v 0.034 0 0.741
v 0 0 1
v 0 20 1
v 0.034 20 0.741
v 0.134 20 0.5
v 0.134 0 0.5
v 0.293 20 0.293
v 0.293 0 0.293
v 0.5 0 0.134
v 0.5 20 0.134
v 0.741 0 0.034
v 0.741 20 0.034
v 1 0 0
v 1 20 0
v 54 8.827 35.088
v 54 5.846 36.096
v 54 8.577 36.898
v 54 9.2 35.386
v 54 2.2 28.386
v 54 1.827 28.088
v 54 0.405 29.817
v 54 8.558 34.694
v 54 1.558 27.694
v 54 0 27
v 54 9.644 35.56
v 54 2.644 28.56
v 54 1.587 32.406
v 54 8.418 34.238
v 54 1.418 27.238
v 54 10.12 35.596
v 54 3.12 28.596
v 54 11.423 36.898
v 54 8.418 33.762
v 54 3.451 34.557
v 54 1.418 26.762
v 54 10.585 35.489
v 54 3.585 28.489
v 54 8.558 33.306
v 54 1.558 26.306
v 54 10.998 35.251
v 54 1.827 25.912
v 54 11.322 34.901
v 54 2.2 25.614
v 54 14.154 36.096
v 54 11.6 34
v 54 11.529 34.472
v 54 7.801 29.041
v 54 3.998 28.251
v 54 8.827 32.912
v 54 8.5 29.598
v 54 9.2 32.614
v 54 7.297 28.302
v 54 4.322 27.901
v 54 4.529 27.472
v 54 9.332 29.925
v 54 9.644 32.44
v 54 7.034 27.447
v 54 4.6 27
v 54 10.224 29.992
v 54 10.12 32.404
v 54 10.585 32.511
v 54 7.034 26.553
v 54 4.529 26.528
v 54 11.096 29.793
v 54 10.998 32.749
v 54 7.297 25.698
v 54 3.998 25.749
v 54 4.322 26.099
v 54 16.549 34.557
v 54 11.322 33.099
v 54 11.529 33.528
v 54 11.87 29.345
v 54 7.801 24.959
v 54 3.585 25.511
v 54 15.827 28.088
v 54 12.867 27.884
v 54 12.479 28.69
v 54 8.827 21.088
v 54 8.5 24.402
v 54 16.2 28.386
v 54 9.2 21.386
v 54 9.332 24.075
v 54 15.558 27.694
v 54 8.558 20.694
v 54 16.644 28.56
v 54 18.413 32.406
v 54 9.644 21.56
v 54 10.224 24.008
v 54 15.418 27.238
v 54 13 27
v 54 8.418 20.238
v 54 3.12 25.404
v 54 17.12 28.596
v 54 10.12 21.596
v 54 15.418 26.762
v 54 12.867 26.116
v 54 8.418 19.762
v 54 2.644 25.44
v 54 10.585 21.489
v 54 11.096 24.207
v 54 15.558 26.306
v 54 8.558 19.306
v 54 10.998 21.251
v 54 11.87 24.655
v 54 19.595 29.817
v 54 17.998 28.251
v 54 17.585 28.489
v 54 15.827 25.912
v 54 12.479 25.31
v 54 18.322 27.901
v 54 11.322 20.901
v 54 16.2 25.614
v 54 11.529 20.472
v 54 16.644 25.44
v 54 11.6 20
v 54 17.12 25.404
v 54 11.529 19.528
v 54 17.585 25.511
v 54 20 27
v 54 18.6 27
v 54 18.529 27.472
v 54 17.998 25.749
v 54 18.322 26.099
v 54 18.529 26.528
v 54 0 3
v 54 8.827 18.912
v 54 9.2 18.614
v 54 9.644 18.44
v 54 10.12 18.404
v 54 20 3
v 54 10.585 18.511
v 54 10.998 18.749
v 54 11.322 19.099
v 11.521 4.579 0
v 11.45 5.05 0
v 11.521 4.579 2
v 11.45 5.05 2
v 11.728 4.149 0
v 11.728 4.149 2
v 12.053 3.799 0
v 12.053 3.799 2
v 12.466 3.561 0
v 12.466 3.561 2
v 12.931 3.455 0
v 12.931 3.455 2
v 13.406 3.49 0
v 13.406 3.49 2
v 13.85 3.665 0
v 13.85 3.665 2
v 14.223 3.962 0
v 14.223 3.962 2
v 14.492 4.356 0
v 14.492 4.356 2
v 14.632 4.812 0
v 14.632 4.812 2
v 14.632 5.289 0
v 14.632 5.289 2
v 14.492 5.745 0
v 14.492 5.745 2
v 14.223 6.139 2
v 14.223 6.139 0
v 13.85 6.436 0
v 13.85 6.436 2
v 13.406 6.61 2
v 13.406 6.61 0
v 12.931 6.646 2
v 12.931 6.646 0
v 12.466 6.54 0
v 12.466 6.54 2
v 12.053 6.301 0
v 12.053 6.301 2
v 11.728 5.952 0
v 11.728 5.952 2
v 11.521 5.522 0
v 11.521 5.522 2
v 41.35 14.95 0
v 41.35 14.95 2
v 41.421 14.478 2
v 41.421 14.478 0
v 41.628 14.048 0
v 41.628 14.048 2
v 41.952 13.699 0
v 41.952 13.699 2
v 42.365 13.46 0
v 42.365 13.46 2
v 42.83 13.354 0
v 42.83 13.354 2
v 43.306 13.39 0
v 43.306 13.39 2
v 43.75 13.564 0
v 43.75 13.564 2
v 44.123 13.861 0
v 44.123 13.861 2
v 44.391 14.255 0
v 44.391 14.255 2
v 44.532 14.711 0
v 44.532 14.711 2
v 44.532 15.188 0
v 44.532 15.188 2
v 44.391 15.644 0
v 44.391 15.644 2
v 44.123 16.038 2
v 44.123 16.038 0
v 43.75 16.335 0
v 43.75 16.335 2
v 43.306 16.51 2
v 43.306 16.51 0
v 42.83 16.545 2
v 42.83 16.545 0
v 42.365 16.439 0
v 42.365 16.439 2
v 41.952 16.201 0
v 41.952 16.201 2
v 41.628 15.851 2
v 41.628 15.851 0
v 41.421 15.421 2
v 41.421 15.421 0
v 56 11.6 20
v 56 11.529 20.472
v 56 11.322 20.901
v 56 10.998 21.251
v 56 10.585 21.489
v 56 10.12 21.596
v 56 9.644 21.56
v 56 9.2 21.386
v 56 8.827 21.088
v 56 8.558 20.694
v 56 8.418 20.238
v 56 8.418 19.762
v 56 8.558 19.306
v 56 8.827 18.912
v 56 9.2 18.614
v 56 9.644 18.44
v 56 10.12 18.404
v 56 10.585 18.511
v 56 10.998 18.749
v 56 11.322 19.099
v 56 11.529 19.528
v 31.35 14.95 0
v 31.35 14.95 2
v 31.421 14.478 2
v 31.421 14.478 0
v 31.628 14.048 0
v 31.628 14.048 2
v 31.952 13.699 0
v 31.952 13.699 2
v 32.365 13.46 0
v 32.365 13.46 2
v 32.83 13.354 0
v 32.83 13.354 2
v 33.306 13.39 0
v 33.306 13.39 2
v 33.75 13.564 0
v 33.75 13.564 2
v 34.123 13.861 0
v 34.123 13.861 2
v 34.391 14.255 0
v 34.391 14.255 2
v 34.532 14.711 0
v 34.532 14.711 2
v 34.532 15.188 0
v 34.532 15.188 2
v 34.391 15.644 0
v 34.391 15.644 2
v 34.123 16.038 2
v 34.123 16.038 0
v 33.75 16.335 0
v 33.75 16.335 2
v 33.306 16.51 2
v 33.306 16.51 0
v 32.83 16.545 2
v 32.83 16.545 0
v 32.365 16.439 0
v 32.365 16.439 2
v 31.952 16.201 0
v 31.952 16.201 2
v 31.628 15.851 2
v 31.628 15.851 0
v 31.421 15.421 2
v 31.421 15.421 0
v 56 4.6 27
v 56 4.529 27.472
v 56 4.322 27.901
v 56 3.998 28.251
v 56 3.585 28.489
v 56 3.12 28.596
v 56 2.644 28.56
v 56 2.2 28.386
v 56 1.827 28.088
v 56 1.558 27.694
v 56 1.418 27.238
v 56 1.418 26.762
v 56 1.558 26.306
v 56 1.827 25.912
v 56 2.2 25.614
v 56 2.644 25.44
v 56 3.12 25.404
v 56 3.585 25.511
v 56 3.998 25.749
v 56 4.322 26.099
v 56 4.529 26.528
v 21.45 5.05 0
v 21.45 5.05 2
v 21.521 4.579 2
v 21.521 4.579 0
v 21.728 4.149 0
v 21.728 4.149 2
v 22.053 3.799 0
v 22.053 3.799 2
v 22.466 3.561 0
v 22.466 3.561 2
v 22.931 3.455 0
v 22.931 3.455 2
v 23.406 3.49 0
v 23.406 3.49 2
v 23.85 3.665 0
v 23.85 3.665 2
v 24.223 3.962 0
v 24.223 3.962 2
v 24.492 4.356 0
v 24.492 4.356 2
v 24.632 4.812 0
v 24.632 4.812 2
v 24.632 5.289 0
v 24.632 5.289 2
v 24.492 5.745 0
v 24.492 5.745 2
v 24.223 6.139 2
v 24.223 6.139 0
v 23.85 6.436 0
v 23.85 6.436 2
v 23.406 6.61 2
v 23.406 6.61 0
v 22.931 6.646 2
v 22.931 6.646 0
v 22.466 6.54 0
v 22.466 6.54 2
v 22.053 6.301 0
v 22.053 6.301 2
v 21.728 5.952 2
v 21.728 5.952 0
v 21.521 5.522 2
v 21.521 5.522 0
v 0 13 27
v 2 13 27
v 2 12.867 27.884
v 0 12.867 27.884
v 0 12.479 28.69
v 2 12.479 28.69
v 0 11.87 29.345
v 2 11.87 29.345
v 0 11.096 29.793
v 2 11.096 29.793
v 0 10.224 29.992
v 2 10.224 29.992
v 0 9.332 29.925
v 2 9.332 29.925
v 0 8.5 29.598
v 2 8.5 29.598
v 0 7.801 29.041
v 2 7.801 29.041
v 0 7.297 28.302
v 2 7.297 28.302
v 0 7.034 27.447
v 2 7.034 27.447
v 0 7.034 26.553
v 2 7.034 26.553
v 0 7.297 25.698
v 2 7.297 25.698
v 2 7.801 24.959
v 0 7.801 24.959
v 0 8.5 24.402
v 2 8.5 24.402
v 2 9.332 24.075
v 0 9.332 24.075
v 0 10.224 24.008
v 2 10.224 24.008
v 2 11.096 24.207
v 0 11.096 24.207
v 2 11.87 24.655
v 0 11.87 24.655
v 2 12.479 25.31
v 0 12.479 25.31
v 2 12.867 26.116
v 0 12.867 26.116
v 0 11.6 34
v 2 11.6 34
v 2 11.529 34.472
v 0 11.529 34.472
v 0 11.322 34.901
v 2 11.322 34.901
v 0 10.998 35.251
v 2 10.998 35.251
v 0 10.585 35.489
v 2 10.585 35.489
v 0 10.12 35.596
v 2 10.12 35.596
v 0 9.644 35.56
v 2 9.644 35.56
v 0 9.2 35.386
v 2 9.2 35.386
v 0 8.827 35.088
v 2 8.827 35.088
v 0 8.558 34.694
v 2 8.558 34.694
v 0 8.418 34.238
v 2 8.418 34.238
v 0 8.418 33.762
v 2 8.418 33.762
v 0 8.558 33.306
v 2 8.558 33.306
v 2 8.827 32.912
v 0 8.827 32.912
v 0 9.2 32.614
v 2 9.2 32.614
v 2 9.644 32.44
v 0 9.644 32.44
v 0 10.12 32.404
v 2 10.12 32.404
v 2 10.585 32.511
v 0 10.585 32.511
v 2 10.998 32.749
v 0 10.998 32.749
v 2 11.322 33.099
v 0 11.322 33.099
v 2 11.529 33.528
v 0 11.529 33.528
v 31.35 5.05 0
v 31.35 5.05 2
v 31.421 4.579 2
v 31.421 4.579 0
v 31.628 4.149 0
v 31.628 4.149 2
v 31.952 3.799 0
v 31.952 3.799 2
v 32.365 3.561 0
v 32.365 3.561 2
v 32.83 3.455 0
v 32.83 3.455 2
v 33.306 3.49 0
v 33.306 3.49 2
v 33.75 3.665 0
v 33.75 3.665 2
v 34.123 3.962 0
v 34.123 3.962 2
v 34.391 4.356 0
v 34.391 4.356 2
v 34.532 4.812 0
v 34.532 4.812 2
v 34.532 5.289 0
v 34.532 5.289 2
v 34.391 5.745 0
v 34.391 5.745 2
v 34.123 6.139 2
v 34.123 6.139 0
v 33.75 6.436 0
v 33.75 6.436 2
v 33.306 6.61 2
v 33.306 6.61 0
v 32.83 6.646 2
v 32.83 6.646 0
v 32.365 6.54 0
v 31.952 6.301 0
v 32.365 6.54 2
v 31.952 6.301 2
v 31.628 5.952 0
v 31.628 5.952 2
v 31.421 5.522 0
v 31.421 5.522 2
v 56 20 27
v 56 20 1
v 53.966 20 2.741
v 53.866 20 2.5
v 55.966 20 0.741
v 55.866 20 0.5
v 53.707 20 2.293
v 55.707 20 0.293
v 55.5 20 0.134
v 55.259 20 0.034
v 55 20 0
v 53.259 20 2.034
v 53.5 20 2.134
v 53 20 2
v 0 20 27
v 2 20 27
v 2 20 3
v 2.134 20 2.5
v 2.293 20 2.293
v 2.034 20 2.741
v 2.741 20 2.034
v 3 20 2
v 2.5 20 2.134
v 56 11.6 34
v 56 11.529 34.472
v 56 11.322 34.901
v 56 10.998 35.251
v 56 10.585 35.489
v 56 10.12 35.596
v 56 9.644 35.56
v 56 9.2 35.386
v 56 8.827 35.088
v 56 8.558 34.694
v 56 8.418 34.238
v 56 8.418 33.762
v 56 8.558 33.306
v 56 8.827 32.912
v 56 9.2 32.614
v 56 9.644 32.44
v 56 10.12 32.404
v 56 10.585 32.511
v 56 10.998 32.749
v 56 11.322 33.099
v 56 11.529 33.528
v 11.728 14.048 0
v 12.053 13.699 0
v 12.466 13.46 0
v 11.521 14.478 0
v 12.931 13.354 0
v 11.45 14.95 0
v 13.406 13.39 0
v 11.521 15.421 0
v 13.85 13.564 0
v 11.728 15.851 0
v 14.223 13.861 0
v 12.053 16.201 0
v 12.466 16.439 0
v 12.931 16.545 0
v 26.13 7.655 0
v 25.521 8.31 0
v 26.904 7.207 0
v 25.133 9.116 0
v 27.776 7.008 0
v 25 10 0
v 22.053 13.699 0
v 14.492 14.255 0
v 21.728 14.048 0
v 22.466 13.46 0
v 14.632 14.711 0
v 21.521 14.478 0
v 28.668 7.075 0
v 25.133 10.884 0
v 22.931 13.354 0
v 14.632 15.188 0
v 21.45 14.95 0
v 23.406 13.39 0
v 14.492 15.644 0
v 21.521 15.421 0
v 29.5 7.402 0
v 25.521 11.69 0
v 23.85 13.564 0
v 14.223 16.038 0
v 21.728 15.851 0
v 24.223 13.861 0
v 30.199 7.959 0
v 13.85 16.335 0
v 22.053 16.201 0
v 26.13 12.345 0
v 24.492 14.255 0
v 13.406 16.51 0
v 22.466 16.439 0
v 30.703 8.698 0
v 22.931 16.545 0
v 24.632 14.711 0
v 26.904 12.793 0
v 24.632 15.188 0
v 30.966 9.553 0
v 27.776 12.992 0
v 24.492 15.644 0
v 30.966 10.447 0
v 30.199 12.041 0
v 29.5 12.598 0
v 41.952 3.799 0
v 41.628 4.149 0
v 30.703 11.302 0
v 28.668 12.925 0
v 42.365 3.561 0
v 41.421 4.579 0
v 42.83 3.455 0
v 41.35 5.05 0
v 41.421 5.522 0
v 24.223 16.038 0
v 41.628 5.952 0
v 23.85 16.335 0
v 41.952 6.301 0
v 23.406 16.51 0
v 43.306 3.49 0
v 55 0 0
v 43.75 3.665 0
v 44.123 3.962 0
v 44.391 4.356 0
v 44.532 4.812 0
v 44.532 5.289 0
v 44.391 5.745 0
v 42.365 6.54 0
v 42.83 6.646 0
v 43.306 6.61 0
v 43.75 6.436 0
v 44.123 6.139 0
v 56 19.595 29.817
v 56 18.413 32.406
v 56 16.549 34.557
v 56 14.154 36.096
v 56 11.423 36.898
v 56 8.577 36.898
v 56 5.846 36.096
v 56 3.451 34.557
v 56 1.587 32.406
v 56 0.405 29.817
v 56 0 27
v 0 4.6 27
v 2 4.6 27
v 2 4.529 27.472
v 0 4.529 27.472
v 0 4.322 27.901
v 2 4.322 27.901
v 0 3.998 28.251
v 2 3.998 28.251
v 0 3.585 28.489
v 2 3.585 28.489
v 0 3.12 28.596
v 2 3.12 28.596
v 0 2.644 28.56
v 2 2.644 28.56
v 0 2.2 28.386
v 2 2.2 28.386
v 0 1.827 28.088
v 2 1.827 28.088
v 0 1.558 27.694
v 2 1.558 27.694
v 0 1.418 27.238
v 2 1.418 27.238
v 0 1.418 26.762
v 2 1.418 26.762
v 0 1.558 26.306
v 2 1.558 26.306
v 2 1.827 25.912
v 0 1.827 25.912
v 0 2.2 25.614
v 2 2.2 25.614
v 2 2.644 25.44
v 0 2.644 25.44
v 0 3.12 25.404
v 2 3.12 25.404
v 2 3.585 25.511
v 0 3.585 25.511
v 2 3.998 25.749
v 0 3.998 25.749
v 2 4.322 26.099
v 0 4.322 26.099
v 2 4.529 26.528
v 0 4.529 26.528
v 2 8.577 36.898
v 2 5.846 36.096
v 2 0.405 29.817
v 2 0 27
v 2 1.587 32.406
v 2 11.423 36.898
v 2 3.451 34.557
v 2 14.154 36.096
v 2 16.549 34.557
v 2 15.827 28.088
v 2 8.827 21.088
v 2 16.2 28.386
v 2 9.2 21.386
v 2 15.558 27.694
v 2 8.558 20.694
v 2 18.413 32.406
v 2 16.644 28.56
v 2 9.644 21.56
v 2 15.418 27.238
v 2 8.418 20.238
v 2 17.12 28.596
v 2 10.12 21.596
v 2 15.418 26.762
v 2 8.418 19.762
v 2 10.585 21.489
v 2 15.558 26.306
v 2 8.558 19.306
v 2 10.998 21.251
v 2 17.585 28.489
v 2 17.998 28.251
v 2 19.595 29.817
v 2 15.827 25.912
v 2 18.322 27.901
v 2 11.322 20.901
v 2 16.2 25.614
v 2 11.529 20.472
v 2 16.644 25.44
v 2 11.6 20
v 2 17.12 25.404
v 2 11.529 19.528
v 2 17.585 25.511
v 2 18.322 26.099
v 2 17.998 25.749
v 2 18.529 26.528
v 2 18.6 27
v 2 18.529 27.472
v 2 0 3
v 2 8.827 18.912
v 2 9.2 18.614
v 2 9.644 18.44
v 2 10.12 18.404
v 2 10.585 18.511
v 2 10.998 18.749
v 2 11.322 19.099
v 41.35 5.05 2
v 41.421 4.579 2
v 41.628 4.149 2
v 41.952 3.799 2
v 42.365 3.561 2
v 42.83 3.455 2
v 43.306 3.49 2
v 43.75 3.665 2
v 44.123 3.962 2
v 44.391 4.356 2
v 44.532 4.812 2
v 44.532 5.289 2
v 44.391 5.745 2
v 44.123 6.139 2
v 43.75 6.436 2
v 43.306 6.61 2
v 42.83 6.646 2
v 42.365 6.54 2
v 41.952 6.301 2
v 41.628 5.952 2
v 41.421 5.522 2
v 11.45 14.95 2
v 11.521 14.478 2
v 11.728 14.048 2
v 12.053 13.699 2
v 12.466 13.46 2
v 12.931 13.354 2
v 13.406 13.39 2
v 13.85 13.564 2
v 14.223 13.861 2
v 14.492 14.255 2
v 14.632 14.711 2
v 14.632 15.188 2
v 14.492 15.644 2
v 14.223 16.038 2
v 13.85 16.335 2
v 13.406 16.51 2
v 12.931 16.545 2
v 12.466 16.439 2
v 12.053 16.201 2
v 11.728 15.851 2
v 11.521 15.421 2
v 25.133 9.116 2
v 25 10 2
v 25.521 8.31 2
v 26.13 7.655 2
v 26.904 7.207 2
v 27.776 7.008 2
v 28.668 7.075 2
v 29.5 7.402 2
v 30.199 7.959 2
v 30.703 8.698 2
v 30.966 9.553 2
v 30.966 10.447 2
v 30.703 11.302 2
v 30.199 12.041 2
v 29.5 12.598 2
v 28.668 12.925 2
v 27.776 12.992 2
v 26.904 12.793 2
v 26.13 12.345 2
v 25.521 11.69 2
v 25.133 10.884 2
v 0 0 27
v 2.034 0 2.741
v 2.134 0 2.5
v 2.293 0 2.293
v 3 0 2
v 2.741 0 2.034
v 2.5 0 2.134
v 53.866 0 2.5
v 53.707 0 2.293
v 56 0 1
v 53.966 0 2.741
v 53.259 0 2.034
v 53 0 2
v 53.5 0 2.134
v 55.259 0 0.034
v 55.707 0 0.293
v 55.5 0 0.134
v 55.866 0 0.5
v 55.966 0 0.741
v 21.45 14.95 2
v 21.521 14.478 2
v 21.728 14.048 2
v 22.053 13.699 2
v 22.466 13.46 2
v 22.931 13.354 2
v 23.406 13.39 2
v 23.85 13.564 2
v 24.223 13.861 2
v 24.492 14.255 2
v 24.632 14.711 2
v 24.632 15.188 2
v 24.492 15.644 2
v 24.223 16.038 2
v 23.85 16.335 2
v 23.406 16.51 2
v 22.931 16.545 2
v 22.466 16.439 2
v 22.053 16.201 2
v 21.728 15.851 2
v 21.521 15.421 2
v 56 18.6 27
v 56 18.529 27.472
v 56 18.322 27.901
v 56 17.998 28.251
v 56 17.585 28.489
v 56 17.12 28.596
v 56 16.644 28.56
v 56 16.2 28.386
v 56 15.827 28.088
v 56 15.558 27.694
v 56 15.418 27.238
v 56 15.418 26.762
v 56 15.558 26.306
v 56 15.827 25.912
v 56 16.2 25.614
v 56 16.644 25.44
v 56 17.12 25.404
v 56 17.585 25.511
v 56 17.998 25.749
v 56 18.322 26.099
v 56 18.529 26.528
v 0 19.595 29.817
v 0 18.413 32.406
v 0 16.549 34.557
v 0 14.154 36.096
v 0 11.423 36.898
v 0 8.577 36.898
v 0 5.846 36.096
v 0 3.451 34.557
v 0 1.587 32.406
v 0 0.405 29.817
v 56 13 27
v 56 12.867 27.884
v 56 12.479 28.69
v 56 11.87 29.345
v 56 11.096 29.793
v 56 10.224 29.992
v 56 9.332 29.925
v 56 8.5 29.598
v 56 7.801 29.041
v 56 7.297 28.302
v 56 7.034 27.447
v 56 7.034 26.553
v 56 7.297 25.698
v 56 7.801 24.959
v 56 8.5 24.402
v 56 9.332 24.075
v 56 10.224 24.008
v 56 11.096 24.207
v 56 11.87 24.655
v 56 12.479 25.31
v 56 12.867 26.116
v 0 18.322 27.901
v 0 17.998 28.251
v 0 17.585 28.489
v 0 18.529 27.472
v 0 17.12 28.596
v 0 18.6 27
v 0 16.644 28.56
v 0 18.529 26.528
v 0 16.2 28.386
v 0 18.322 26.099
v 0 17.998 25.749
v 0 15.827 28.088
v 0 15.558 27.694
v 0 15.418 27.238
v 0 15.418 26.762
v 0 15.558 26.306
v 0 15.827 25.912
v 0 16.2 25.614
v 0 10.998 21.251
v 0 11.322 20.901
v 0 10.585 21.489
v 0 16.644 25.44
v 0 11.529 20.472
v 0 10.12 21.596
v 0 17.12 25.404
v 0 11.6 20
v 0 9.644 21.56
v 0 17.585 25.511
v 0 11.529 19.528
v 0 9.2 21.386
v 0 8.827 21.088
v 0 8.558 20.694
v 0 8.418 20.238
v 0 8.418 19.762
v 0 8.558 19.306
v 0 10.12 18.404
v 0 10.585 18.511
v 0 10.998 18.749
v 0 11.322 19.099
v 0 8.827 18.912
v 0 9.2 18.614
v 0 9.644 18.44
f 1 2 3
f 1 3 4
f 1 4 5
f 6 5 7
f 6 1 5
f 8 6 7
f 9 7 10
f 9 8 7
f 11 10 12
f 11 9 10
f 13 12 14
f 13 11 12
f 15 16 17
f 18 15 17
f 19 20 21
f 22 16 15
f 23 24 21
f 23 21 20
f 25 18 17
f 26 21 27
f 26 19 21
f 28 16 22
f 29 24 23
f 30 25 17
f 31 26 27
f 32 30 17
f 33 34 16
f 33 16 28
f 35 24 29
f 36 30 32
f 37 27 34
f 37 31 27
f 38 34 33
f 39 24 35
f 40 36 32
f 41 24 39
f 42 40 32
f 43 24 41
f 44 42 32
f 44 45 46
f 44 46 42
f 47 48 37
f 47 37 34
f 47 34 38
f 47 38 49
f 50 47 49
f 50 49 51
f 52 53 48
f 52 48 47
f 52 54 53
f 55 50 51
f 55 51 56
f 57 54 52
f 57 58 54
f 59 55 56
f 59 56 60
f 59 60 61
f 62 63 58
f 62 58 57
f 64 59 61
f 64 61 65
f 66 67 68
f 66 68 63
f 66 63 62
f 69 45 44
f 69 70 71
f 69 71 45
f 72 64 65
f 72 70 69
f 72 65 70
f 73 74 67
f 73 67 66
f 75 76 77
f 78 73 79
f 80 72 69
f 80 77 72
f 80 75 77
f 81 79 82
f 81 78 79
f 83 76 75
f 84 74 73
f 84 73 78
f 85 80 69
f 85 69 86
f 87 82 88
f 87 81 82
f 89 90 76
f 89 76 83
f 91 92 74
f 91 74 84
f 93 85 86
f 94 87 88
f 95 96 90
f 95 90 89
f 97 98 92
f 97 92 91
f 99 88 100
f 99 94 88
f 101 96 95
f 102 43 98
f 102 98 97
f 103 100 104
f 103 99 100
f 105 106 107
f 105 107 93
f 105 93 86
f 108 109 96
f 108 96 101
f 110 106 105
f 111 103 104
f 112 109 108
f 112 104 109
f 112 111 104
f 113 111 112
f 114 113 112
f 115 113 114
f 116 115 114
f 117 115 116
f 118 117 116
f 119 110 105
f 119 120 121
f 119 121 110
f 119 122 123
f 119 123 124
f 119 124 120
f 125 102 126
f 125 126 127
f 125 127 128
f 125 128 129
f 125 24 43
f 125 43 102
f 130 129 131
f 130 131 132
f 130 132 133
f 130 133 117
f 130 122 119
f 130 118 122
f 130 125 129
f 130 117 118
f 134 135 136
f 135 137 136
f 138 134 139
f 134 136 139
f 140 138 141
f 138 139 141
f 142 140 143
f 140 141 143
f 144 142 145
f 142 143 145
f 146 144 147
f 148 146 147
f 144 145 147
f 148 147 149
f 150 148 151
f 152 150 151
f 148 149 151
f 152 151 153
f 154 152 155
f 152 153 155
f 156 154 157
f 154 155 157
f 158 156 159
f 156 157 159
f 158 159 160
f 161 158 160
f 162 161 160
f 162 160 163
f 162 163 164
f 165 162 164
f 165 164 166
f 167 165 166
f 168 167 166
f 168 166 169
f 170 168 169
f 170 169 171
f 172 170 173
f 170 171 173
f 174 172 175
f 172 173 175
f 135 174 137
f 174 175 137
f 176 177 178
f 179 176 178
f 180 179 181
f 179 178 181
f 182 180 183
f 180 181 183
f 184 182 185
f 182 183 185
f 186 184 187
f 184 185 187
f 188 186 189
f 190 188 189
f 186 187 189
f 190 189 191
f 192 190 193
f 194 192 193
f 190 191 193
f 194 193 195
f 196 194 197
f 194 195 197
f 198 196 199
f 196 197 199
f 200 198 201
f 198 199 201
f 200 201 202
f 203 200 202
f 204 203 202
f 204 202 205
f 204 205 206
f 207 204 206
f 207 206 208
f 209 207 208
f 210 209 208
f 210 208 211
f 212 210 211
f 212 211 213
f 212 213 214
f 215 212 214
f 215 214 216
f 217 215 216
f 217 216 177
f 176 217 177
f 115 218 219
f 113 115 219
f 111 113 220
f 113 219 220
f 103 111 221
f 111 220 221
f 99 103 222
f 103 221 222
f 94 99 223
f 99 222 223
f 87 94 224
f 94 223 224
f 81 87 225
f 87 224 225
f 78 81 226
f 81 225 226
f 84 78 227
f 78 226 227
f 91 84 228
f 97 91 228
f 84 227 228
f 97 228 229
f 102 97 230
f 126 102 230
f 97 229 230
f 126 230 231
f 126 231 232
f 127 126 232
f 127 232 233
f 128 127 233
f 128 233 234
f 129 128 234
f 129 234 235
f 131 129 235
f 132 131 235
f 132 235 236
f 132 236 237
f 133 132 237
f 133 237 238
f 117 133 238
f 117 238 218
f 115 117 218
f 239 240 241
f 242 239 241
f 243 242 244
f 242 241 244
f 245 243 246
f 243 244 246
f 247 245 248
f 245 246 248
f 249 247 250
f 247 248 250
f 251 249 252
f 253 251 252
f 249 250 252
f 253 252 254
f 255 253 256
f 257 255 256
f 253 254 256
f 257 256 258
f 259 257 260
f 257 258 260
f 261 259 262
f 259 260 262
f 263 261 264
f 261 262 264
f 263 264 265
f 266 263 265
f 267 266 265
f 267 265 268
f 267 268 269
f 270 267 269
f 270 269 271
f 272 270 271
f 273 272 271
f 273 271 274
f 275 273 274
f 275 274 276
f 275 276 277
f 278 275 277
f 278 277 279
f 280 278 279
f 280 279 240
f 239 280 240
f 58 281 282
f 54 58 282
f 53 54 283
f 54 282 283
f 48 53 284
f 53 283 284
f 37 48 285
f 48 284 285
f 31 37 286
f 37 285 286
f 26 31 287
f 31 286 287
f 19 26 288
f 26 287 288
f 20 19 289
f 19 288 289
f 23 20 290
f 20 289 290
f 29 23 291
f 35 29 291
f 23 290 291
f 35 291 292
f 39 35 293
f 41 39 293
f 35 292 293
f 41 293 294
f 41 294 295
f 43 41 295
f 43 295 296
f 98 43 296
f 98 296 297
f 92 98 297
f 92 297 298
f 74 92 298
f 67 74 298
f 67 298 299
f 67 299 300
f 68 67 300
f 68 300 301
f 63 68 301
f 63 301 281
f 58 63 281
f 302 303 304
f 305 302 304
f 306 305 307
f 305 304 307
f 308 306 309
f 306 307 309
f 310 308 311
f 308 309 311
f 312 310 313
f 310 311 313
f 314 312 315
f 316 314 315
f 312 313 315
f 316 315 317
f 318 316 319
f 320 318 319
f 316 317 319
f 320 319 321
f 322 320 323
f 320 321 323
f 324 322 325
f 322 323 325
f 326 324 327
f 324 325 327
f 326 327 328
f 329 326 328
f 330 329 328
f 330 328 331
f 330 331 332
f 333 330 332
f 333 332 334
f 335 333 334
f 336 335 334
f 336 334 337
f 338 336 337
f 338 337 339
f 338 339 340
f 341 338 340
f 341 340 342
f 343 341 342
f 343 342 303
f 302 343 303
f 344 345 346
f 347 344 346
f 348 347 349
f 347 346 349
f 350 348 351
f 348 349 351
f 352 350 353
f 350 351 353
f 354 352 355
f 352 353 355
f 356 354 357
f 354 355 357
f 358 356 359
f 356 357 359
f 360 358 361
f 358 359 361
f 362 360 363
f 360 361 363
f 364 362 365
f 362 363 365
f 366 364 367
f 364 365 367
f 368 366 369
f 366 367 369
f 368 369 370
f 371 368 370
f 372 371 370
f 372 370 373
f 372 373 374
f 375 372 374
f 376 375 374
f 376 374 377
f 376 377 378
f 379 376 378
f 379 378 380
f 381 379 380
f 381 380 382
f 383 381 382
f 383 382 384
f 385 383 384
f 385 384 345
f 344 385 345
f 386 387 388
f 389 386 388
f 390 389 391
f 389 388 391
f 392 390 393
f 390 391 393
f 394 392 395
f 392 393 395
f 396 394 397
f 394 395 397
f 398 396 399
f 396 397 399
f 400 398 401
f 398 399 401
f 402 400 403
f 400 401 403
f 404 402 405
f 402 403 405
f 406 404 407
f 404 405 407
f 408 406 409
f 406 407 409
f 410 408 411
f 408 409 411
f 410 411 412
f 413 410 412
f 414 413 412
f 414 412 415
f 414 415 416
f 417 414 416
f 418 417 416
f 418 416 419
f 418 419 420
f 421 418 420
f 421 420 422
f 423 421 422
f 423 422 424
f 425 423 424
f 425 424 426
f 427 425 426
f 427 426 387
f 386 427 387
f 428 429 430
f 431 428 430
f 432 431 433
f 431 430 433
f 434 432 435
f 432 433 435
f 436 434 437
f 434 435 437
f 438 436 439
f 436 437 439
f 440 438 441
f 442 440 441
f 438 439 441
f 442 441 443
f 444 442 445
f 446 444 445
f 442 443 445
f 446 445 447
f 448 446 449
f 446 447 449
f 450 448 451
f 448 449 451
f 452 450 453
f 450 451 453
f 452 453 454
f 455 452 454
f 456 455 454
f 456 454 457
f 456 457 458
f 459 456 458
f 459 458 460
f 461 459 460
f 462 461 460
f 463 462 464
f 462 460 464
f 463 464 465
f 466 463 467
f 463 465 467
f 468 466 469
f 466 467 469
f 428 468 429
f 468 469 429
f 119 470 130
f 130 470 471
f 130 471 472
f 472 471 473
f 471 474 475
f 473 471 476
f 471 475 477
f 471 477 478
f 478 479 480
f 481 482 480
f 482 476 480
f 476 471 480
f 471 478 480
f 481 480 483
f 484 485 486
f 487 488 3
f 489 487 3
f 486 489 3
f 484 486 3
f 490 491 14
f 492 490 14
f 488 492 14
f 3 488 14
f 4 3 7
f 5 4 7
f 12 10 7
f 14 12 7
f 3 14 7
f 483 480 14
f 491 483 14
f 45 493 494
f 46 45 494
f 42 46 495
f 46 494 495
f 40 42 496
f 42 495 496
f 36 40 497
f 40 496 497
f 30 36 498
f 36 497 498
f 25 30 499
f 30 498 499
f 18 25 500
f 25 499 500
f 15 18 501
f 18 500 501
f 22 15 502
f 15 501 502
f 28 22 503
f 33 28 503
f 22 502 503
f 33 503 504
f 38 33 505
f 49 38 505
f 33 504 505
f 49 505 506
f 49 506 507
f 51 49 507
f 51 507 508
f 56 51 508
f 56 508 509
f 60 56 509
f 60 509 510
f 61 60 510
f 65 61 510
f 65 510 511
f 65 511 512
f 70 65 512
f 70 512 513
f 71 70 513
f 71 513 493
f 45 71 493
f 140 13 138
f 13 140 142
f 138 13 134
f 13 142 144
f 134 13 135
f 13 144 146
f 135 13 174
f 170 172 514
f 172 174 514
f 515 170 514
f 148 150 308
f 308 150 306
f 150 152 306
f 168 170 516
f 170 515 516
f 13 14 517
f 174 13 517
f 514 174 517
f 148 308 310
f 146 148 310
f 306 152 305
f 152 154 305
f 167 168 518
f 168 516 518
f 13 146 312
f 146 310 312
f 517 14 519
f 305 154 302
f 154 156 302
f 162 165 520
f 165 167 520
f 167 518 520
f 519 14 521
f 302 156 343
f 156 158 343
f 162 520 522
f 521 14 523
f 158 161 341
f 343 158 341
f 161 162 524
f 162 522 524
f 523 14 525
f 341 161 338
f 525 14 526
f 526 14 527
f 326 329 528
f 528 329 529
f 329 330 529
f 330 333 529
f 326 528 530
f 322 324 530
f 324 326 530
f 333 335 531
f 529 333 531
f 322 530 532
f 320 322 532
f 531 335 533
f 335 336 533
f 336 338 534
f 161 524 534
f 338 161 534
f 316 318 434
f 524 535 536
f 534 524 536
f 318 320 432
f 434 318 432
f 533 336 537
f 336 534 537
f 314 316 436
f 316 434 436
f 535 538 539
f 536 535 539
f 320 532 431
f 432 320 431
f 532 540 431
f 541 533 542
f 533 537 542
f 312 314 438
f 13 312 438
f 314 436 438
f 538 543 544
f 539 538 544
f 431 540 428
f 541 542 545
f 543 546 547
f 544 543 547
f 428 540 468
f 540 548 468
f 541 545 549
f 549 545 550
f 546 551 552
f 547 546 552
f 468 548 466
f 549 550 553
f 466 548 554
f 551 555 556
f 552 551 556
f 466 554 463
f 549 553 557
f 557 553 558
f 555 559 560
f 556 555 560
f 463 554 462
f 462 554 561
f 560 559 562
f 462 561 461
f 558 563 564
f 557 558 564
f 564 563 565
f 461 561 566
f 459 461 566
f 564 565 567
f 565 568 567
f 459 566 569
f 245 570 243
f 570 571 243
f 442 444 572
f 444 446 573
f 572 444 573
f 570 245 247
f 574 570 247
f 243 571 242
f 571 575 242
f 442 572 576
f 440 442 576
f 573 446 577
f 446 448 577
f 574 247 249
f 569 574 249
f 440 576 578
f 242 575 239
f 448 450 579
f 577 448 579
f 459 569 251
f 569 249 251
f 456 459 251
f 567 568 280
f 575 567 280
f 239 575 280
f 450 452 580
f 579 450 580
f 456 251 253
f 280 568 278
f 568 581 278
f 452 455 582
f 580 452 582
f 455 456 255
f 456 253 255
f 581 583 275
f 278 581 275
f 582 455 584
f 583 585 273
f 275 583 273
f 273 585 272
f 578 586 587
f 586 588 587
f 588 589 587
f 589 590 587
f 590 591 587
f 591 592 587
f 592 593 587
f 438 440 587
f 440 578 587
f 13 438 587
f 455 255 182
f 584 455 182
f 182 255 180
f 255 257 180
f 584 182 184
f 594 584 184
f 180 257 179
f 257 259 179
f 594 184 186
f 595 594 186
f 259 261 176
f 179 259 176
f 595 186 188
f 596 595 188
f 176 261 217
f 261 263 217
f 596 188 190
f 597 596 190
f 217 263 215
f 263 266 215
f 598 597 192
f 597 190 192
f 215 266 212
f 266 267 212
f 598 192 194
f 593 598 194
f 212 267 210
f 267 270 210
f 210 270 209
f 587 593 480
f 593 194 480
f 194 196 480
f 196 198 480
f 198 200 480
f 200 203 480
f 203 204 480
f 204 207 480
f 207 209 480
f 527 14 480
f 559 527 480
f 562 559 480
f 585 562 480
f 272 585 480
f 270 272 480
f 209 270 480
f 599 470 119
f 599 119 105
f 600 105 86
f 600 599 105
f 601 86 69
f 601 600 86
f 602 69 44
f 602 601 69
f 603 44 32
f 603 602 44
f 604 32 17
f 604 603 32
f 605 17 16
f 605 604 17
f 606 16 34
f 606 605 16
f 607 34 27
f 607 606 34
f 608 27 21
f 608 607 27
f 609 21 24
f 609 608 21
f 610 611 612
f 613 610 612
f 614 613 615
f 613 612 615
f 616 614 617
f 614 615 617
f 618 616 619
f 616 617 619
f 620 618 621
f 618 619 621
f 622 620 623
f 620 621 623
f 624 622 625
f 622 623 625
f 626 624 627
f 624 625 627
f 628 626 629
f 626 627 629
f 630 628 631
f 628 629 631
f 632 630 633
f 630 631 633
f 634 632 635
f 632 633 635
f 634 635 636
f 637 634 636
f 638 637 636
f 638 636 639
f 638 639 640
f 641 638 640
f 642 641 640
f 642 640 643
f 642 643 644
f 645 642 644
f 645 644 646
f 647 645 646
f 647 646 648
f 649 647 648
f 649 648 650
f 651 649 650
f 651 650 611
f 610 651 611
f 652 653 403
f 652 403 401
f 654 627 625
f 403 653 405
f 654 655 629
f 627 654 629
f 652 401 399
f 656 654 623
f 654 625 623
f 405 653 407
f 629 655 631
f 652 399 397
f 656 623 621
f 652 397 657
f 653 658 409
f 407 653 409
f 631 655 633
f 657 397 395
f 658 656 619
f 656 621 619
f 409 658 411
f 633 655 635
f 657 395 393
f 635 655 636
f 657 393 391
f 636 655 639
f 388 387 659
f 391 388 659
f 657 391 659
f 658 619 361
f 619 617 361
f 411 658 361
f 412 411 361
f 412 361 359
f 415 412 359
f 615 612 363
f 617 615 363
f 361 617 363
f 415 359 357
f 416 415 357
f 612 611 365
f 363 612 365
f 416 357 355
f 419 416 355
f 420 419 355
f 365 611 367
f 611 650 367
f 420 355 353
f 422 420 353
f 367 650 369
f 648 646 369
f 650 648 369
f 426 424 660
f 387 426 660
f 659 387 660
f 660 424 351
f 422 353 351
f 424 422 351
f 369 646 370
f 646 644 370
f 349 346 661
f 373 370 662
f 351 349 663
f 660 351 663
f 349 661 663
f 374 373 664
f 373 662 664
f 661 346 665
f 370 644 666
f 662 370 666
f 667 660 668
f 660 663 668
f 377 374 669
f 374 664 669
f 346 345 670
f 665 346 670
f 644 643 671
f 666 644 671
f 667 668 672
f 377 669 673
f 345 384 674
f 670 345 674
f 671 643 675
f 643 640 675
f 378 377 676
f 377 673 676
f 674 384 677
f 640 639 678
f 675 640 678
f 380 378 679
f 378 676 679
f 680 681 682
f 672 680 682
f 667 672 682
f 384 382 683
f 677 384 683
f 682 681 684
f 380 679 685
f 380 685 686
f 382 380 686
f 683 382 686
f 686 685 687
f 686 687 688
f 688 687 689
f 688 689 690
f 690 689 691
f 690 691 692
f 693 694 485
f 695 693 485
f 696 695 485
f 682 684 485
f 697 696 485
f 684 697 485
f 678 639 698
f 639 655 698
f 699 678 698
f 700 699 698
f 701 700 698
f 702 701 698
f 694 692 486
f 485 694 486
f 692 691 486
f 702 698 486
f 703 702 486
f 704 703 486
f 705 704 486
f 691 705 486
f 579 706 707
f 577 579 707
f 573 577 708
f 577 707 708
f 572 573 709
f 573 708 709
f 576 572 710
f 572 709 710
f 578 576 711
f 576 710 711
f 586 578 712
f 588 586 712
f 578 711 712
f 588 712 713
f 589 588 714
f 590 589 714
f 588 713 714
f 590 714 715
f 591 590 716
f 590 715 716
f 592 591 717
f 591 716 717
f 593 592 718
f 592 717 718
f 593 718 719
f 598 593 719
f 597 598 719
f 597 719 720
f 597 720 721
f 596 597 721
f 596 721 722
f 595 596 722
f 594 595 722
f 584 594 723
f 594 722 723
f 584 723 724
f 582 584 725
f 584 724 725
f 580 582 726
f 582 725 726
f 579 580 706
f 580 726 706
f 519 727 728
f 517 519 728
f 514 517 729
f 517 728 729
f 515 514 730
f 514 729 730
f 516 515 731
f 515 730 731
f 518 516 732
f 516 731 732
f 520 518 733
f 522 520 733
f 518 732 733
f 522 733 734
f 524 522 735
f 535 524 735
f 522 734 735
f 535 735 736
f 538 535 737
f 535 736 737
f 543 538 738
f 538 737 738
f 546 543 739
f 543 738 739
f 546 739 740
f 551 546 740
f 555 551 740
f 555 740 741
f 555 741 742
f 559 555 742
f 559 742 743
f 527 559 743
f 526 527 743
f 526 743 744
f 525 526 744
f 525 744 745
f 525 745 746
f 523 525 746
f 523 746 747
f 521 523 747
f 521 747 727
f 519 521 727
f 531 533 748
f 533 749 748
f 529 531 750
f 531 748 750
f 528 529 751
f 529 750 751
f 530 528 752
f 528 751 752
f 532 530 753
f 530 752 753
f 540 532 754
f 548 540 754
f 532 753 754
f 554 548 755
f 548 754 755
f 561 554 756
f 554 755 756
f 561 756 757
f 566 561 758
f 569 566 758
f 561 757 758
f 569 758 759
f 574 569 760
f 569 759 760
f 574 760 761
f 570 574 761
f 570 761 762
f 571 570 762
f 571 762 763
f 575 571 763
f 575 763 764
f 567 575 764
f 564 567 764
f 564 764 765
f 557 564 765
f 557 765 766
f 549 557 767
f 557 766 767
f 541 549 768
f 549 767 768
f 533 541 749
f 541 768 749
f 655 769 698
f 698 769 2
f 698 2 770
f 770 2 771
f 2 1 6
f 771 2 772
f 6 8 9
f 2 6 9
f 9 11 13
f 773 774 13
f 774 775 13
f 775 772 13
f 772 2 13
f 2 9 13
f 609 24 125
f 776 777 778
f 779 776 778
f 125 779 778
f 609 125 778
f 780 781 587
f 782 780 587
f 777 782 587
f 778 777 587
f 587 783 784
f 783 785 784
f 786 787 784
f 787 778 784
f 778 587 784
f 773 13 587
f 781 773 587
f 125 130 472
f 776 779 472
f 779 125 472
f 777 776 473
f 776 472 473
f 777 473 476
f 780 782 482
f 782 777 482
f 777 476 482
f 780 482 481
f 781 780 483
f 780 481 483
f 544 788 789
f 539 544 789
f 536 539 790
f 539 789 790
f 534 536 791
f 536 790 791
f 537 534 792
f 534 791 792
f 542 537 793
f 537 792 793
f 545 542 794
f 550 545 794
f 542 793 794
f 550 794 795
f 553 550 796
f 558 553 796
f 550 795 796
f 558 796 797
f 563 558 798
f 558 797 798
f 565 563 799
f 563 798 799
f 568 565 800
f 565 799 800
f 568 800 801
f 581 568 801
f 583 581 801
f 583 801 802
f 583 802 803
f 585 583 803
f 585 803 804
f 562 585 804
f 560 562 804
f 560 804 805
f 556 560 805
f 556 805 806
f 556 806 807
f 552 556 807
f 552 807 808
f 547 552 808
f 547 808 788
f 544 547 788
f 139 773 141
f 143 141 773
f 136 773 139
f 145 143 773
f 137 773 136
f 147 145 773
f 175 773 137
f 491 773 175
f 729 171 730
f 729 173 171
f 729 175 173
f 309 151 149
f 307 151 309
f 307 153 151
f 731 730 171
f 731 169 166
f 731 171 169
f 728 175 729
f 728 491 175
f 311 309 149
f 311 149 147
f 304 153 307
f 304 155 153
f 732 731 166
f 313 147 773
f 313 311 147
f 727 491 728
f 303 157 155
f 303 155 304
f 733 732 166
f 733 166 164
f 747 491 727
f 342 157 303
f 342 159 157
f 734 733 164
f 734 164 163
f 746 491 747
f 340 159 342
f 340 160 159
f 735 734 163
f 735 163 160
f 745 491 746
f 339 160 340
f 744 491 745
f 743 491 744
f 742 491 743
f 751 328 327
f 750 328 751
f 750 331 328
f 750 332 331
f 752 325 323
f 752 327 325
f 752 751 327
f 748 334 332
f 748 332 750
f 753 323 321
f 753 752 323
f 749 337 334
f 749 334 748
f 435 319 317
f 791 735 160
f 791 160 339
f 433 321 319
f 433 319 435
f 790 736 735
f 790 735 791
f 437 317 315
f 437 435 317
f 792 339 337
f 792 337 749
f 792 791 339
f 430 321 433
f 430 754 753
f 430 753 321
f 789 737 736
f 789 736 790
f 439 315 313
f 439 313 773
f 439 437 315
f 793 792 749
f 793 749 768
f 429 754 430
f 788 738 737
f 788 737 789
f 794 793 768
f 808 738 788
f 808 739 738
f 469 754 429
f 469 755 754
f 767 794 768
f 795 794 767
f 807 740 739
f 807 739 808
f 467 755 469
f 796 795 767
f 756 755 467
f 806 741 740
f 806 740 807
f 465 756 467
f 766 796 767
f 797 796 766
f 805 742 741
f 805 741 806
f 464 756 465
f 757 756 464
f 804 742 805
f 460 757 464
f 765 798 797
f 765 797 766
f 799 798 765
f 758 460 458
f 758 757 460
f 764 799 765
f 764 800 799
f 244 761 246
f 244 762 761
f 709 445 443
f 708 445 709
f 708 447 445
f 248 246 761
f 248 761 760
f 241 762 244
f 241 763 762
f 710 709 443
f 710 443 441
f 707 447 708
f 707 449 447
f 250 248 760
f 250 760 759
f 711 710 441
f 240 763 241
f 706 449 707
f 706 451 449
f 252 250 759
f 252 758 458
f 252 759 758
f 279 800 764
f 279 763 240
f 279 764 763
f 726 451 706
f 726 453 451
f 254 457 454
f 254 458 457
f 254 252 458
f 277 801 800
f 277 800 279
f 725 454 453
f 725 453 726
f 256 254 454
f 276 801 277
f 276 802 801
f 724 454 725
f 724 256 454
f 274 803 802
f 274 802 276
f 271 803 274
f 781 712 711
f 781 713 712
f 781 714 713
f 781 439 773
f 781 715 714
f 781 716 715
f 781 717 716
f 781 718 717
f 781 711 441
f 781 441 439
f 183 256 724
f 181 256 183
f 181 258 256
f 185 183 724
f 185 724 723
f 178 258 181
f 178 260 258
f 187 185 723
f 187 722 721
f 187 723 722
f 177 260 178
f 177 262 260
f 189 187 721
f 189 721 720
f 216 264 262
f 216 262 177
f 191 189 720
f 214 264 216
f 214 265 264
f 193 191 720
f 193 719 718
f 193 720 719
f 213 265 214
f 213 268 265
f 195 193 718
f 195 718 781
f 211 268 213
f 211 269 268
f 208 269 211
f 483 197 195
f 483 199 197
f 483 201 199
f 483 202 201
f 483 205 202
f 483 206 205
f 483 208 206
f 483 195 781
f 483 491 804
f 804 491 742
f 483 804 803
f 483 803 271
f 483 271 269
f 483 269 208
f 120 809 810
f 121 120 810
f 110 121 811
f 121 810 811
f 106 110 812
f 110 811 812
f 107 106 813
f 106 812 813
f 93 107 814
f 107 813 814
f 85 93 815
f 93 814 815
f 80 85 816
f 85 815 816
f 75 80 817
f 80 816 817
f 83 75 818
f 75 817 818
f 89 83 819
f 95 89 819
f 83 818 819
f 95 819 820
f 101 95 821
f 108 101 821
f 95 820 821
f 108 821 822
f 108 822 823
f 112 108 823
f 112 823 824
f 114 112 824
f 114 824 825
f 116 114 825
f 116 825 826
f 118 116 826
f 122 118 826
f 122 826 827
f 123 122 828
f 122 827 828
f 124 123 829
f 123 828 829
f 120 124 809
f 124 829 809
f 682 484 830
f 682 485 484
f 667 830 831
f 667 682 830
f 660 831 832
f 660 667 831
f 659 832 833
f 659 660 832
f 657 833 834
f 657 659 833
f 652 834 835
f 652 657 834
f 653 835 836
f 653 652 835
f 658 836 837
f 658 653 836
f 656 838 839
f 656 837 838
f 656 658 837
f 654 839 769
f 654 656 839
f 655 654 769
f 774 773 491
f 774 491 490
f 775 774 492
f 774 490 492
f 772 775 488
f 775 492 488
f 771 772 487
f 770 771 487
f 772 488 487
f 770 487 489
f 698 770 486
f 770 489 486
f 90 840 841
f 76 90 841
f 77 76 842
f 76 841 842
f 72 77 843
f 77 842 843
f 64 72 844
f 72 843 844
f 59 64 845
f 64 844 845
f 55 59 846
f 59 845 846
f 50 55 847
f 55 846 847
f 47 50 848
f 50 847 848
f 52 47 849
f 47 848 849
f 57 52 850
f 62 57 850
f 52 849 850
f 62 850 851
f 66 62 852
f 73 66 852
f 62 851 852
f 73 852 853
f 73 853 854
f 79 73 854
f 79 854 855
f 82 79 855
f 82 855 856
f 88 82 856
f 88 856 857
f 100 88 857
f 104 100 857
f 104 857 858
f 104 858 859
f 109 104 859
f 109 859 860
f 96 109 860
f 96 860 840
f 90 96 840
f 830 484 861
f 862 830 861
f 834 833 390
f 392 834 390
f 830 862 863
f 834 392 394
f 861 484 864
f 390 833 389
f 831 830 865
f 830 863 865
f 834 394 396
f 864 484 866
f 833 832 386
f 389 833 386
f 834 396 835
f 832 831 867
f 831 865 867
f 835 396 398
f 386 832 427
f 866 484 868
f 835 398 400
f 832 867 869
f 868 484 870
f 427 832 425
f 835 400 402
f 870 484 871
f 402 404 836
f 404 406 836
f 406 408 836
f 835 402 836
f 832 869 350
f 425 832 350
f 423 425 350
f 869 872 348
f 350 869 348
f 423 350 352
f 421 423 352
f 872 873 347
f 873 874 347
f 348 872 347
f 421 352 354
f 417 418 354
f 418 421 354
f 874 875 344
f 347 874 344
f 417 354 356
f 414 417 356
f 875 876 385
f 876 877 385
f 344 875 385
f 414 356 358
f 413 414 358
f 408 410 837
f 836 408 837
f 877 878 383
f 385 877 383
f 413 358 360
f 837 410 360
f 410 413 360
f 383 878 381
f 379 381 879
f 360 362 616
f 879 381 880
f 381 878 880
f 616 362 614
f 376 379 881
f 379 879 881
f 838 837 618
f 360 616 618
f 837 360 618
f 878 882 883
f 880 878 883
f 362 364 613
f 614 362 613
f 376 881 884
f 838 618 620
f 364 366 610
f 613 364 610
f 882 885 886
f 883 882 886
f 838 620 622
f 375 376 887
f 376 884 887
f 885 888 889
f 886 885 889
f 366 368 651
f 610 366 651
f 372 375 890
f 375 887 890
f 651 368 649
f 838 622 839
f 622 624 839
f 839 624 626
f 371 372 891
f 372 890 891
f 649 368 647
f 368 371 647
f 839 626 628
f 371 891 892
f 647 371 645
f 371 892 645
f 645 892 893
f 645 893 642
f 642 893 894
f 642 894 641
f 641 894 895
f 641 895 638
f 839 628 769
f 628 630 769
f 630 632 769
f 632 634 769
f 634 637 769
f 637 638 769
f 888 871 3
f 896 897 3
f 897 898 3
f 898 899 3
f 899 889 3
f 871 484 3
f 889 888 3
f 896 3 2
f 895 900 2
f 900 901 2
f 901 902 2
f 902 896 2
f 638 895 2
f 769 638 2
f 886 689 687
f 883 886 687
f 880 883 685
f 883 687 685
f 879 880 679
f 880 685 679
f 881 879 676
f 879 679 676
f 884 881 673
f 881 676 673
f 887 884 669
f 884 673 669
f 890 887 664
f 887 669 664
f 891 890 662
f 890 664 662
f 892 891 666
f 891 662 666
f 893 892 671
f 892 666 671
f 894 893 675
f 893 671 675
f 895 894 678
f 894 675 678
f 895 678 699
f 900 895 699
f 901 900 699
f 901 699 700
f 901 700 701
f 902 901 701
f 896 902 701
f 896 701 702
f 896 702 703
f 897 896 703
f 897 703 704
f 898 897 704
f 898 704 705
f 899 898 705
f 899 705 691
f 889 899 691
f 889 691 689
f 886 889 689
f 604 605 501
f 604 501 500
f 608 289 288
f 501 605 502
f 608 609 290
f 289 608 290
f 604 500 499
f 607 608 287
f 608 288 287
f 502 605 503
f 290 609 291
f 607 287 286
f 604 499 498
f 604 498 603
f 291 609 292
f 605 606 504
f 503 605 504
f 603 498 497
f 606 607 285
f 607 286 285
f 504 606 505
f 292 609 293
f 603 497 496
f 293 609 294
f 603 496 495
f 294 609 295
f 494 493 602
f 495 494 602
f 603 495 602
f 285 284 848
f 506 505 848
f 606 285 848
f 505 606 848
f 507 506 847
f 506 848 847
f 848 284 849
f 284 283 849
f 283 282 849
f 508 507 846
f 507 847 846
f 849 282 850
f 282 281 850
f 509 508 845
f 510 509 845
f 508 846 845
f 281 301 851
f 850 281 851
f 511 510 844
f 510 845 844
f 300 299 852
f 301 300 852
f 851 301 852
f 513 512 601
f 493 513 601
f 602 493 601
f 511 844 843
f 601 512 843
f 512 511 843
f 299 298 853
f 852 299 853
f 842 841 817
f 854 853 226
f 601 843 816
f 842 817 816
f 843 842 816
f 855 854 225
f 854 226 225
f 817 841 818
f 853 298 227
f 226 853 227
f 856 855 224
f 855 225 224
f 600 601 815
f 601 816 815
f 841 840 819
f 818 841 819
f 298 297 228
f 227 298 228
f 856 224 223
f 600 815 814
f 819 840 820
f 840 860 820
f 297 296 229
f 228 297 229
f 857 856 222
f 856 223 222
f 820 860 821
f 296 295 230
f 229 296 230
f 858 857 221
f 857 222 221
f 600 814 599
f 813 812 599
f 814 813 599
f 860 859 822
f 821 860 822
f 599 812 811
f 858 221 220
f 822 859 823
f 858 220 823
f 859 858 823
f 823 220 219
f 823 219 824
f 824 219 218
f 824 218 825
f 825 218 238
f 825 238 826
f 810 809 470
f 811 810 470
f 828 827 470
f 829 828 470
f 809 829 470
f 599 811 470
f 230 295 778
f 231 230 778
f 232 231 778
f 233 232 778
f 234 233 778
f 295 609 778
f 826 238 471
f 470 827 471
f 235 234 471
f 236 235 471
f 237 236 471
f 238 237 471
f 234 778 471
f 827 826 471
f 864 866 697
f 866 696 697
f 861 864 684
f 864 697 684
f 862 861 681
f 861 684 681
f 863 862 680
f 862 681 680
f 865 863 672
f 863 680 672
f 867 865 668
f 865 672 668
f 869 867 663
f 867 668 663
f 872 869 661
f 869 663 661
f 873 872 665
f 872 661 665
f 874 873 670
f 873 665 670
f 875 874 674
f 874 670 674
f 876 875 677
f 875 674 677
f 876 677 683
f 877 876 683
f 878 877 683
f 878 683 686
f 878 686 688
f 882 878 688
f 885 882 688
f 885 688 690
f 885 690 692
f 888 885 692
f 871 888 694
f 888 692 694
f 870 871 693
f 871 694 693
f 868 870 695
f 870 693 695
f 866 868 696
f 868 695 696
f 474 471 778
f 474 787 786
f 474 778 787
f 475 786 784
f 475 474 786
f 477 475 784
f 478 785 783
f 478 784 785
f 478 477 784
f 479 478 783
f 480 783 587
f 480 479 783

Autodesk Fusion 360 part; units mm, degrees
sketch "草图1" plane through (0, 0, 0) normal (0, 0, 1) x (1, 0, 0)
  line L0 (0, 0) -> (56, 0)
  line L1 (56, 0) -> (56, 20)
  line L2 (56, 20) -> (0, 20)
  line L3 (0, 20) -> (0, 0)
  dimension "d1" = 56
  dimension "d2" = 20
extrude "拉伸1" add sketch "草图1" along normal blind 2 makes body 1
sketch "草图2" plane through (0, 0, 2) normal (0, 0, 1) x (-1, 0, 0)
  line L0 (0, -20) -> (0, 0)
  line L1 (0, 0) -> (-56, 0)
  line L2 (-56, 0) -> (-56, -20)
  line L3 (-56, -20) -> (0, -20)
  line L4 (-10, -10) -> (-50.5346, -10)
  line L5 (-28, -17) -> (-28, -4)
  circle A0 centre (-28, -10) radius 3
  circle A1 centre (-28, -10) radius 7 construction
  line L6 (-28, -10) -> (-35.6485, -17.6485) construction
  circle A2 centre (-32.9497, -14.9497) radius 1.6
  circle A3 centre (-23.0503, -14.9497) radius 1.6
  circle A4 centre (-23.0503, -5.0503) radius 1.6
  circle A5 centre (-32.9497, -5.0503) radius 1.6
  circle A6 centre (-42.9497, -14.9497) radius 1.6
  circle A7 centre (-42.9497, -5.0503) radius 1.6
  circle A8 centre (-13.0503, -14.9497) radius 1.6
  circle A9 centre (-13.0503, -5.0503) radius 1.6
  dimension "d5" = 6
  dimension "d6" = 14
  dimension "d7" = 45
  dimension "d8" = 3.2
  dimension "d10" = 360
  dimension "d13" = -10
  dimension "d14" = 3
extrude "拉伸2" cut sketch "草图2" against normal blind 2 contours L4 L5 A0 | L4 L5 A0 | L4 L5 A0 | L4 L5 A0 | A2 | A3 | A4 | A5 | A6 | A7 | A8 | A9 bodies 1
sketch "草图3" plane through (0, 0, 2) normal (0, 0, 1) x (-1, 0, 0)
  circle A0 centre (-42.9497, -14.9497) radius 1.6
  circle A1 centre (-23.0503, -14.9497) radius 1.6
  circle A2 centre (-13.0503, -5.0503) radius 1.6
  circle A3 centre (-32.9497, -14.9497) radius 1.6
  circle A4 centre (-42.9497, -5.0503) radius 1.6
  circle A5 centre (-28, -10) radius 3
  circle A6 centre (-13.0503, -14.9497) radius 1.6
  circle A7 centre (-23.0503, -5.0503) radius 1.6
  circle A8 centre (-32.9497, -5.0503) radius 1.6
  line L0 (0, -20) -> (0, 0)
  line L1 (0, 0) -> (-56, 0)
  line L2 (-56, 0) -> (-56, -20)
  line L3 (-56, -20) -> (0, -20)
  line L4 (0, 0) -> (-2, 0)
  line L5 (-2, 0) -> (-2, -20)
  line L6 (-2, -20) -> (0, -20)
  line L7 (0, -20) -> (0, 0)
  line L8 (-56, 0) -> (-54, 0)
  line L9 (-54, 0) -> (-54, -20)
  line L10 (-54, -20) -> (-56, -20)
  line L11 (-56, -20) -> (-56, 0)
  dimension "d17" = 2
  dimension "d18" = 2
extrude "拉伸3" add sketch "草图3" along normal blind 35 contours L0 L1 L3 L4 L5 L6 L7 | L1 L2 L3 L8 L9 L10 L11 bodies 1
fillet "圆角1" radius 1 4 edges at (56, 10, 0) (54, 10, 2) (2, 10, 2) (0, 10, 0) on bodies 1
sketch "草图4" plane through (56, 0, 0) normal (1, 0, 0) x (0, 1, 0)
  line L0 (0, 1) -> (20, 1)
  line L1 (20, 1) -> (20, 37)
  line L2 (20, 37) -> (0, 37)
  line L3 (0, 37) -> (0, 1)
  circle A0 centre (10, 27) radius 7 construction
  line L4 (0, 27) -> (0, 37)
  line L5 (20, 37) -> (20, 27)
  arc A1 (20, 26.9983) -> (0, 27) centre (10, 27) ccw
  line L6 (10, 27) -> (19, 27) construction
  circle A2 centre (17, 27) radius 1.6
  circle A3 centre (10, 34) radius 1.6
  circle A4 centre (3, 27) radius 1.6
  circle A5 centre (10, 20) radius 1.6
  circle A6 centre (10, 27) radius 3
  dimension "d23" = 14
  dimension "d24" = 27
  dimension "d25" = 20
  dimension "d26" = 3.2
  dimension "d28" = 360
  dimension "d29" = 6
extrude "拉伸4" cut sketch "草图4" against normal blind 56 contours L2 L3 L4 A1 | L1 L2 L5 A1 | A2 | A3 | A4 | A5 | A6 bodies 1
copy_body "实体->零部件1" bodies 1 removing the originals makes body 2 in component "Component'"
component "Component'" placed x (1, 0, 0) y (0, 1, 0) z (0, 0, 1) at (0, 0, 0)
